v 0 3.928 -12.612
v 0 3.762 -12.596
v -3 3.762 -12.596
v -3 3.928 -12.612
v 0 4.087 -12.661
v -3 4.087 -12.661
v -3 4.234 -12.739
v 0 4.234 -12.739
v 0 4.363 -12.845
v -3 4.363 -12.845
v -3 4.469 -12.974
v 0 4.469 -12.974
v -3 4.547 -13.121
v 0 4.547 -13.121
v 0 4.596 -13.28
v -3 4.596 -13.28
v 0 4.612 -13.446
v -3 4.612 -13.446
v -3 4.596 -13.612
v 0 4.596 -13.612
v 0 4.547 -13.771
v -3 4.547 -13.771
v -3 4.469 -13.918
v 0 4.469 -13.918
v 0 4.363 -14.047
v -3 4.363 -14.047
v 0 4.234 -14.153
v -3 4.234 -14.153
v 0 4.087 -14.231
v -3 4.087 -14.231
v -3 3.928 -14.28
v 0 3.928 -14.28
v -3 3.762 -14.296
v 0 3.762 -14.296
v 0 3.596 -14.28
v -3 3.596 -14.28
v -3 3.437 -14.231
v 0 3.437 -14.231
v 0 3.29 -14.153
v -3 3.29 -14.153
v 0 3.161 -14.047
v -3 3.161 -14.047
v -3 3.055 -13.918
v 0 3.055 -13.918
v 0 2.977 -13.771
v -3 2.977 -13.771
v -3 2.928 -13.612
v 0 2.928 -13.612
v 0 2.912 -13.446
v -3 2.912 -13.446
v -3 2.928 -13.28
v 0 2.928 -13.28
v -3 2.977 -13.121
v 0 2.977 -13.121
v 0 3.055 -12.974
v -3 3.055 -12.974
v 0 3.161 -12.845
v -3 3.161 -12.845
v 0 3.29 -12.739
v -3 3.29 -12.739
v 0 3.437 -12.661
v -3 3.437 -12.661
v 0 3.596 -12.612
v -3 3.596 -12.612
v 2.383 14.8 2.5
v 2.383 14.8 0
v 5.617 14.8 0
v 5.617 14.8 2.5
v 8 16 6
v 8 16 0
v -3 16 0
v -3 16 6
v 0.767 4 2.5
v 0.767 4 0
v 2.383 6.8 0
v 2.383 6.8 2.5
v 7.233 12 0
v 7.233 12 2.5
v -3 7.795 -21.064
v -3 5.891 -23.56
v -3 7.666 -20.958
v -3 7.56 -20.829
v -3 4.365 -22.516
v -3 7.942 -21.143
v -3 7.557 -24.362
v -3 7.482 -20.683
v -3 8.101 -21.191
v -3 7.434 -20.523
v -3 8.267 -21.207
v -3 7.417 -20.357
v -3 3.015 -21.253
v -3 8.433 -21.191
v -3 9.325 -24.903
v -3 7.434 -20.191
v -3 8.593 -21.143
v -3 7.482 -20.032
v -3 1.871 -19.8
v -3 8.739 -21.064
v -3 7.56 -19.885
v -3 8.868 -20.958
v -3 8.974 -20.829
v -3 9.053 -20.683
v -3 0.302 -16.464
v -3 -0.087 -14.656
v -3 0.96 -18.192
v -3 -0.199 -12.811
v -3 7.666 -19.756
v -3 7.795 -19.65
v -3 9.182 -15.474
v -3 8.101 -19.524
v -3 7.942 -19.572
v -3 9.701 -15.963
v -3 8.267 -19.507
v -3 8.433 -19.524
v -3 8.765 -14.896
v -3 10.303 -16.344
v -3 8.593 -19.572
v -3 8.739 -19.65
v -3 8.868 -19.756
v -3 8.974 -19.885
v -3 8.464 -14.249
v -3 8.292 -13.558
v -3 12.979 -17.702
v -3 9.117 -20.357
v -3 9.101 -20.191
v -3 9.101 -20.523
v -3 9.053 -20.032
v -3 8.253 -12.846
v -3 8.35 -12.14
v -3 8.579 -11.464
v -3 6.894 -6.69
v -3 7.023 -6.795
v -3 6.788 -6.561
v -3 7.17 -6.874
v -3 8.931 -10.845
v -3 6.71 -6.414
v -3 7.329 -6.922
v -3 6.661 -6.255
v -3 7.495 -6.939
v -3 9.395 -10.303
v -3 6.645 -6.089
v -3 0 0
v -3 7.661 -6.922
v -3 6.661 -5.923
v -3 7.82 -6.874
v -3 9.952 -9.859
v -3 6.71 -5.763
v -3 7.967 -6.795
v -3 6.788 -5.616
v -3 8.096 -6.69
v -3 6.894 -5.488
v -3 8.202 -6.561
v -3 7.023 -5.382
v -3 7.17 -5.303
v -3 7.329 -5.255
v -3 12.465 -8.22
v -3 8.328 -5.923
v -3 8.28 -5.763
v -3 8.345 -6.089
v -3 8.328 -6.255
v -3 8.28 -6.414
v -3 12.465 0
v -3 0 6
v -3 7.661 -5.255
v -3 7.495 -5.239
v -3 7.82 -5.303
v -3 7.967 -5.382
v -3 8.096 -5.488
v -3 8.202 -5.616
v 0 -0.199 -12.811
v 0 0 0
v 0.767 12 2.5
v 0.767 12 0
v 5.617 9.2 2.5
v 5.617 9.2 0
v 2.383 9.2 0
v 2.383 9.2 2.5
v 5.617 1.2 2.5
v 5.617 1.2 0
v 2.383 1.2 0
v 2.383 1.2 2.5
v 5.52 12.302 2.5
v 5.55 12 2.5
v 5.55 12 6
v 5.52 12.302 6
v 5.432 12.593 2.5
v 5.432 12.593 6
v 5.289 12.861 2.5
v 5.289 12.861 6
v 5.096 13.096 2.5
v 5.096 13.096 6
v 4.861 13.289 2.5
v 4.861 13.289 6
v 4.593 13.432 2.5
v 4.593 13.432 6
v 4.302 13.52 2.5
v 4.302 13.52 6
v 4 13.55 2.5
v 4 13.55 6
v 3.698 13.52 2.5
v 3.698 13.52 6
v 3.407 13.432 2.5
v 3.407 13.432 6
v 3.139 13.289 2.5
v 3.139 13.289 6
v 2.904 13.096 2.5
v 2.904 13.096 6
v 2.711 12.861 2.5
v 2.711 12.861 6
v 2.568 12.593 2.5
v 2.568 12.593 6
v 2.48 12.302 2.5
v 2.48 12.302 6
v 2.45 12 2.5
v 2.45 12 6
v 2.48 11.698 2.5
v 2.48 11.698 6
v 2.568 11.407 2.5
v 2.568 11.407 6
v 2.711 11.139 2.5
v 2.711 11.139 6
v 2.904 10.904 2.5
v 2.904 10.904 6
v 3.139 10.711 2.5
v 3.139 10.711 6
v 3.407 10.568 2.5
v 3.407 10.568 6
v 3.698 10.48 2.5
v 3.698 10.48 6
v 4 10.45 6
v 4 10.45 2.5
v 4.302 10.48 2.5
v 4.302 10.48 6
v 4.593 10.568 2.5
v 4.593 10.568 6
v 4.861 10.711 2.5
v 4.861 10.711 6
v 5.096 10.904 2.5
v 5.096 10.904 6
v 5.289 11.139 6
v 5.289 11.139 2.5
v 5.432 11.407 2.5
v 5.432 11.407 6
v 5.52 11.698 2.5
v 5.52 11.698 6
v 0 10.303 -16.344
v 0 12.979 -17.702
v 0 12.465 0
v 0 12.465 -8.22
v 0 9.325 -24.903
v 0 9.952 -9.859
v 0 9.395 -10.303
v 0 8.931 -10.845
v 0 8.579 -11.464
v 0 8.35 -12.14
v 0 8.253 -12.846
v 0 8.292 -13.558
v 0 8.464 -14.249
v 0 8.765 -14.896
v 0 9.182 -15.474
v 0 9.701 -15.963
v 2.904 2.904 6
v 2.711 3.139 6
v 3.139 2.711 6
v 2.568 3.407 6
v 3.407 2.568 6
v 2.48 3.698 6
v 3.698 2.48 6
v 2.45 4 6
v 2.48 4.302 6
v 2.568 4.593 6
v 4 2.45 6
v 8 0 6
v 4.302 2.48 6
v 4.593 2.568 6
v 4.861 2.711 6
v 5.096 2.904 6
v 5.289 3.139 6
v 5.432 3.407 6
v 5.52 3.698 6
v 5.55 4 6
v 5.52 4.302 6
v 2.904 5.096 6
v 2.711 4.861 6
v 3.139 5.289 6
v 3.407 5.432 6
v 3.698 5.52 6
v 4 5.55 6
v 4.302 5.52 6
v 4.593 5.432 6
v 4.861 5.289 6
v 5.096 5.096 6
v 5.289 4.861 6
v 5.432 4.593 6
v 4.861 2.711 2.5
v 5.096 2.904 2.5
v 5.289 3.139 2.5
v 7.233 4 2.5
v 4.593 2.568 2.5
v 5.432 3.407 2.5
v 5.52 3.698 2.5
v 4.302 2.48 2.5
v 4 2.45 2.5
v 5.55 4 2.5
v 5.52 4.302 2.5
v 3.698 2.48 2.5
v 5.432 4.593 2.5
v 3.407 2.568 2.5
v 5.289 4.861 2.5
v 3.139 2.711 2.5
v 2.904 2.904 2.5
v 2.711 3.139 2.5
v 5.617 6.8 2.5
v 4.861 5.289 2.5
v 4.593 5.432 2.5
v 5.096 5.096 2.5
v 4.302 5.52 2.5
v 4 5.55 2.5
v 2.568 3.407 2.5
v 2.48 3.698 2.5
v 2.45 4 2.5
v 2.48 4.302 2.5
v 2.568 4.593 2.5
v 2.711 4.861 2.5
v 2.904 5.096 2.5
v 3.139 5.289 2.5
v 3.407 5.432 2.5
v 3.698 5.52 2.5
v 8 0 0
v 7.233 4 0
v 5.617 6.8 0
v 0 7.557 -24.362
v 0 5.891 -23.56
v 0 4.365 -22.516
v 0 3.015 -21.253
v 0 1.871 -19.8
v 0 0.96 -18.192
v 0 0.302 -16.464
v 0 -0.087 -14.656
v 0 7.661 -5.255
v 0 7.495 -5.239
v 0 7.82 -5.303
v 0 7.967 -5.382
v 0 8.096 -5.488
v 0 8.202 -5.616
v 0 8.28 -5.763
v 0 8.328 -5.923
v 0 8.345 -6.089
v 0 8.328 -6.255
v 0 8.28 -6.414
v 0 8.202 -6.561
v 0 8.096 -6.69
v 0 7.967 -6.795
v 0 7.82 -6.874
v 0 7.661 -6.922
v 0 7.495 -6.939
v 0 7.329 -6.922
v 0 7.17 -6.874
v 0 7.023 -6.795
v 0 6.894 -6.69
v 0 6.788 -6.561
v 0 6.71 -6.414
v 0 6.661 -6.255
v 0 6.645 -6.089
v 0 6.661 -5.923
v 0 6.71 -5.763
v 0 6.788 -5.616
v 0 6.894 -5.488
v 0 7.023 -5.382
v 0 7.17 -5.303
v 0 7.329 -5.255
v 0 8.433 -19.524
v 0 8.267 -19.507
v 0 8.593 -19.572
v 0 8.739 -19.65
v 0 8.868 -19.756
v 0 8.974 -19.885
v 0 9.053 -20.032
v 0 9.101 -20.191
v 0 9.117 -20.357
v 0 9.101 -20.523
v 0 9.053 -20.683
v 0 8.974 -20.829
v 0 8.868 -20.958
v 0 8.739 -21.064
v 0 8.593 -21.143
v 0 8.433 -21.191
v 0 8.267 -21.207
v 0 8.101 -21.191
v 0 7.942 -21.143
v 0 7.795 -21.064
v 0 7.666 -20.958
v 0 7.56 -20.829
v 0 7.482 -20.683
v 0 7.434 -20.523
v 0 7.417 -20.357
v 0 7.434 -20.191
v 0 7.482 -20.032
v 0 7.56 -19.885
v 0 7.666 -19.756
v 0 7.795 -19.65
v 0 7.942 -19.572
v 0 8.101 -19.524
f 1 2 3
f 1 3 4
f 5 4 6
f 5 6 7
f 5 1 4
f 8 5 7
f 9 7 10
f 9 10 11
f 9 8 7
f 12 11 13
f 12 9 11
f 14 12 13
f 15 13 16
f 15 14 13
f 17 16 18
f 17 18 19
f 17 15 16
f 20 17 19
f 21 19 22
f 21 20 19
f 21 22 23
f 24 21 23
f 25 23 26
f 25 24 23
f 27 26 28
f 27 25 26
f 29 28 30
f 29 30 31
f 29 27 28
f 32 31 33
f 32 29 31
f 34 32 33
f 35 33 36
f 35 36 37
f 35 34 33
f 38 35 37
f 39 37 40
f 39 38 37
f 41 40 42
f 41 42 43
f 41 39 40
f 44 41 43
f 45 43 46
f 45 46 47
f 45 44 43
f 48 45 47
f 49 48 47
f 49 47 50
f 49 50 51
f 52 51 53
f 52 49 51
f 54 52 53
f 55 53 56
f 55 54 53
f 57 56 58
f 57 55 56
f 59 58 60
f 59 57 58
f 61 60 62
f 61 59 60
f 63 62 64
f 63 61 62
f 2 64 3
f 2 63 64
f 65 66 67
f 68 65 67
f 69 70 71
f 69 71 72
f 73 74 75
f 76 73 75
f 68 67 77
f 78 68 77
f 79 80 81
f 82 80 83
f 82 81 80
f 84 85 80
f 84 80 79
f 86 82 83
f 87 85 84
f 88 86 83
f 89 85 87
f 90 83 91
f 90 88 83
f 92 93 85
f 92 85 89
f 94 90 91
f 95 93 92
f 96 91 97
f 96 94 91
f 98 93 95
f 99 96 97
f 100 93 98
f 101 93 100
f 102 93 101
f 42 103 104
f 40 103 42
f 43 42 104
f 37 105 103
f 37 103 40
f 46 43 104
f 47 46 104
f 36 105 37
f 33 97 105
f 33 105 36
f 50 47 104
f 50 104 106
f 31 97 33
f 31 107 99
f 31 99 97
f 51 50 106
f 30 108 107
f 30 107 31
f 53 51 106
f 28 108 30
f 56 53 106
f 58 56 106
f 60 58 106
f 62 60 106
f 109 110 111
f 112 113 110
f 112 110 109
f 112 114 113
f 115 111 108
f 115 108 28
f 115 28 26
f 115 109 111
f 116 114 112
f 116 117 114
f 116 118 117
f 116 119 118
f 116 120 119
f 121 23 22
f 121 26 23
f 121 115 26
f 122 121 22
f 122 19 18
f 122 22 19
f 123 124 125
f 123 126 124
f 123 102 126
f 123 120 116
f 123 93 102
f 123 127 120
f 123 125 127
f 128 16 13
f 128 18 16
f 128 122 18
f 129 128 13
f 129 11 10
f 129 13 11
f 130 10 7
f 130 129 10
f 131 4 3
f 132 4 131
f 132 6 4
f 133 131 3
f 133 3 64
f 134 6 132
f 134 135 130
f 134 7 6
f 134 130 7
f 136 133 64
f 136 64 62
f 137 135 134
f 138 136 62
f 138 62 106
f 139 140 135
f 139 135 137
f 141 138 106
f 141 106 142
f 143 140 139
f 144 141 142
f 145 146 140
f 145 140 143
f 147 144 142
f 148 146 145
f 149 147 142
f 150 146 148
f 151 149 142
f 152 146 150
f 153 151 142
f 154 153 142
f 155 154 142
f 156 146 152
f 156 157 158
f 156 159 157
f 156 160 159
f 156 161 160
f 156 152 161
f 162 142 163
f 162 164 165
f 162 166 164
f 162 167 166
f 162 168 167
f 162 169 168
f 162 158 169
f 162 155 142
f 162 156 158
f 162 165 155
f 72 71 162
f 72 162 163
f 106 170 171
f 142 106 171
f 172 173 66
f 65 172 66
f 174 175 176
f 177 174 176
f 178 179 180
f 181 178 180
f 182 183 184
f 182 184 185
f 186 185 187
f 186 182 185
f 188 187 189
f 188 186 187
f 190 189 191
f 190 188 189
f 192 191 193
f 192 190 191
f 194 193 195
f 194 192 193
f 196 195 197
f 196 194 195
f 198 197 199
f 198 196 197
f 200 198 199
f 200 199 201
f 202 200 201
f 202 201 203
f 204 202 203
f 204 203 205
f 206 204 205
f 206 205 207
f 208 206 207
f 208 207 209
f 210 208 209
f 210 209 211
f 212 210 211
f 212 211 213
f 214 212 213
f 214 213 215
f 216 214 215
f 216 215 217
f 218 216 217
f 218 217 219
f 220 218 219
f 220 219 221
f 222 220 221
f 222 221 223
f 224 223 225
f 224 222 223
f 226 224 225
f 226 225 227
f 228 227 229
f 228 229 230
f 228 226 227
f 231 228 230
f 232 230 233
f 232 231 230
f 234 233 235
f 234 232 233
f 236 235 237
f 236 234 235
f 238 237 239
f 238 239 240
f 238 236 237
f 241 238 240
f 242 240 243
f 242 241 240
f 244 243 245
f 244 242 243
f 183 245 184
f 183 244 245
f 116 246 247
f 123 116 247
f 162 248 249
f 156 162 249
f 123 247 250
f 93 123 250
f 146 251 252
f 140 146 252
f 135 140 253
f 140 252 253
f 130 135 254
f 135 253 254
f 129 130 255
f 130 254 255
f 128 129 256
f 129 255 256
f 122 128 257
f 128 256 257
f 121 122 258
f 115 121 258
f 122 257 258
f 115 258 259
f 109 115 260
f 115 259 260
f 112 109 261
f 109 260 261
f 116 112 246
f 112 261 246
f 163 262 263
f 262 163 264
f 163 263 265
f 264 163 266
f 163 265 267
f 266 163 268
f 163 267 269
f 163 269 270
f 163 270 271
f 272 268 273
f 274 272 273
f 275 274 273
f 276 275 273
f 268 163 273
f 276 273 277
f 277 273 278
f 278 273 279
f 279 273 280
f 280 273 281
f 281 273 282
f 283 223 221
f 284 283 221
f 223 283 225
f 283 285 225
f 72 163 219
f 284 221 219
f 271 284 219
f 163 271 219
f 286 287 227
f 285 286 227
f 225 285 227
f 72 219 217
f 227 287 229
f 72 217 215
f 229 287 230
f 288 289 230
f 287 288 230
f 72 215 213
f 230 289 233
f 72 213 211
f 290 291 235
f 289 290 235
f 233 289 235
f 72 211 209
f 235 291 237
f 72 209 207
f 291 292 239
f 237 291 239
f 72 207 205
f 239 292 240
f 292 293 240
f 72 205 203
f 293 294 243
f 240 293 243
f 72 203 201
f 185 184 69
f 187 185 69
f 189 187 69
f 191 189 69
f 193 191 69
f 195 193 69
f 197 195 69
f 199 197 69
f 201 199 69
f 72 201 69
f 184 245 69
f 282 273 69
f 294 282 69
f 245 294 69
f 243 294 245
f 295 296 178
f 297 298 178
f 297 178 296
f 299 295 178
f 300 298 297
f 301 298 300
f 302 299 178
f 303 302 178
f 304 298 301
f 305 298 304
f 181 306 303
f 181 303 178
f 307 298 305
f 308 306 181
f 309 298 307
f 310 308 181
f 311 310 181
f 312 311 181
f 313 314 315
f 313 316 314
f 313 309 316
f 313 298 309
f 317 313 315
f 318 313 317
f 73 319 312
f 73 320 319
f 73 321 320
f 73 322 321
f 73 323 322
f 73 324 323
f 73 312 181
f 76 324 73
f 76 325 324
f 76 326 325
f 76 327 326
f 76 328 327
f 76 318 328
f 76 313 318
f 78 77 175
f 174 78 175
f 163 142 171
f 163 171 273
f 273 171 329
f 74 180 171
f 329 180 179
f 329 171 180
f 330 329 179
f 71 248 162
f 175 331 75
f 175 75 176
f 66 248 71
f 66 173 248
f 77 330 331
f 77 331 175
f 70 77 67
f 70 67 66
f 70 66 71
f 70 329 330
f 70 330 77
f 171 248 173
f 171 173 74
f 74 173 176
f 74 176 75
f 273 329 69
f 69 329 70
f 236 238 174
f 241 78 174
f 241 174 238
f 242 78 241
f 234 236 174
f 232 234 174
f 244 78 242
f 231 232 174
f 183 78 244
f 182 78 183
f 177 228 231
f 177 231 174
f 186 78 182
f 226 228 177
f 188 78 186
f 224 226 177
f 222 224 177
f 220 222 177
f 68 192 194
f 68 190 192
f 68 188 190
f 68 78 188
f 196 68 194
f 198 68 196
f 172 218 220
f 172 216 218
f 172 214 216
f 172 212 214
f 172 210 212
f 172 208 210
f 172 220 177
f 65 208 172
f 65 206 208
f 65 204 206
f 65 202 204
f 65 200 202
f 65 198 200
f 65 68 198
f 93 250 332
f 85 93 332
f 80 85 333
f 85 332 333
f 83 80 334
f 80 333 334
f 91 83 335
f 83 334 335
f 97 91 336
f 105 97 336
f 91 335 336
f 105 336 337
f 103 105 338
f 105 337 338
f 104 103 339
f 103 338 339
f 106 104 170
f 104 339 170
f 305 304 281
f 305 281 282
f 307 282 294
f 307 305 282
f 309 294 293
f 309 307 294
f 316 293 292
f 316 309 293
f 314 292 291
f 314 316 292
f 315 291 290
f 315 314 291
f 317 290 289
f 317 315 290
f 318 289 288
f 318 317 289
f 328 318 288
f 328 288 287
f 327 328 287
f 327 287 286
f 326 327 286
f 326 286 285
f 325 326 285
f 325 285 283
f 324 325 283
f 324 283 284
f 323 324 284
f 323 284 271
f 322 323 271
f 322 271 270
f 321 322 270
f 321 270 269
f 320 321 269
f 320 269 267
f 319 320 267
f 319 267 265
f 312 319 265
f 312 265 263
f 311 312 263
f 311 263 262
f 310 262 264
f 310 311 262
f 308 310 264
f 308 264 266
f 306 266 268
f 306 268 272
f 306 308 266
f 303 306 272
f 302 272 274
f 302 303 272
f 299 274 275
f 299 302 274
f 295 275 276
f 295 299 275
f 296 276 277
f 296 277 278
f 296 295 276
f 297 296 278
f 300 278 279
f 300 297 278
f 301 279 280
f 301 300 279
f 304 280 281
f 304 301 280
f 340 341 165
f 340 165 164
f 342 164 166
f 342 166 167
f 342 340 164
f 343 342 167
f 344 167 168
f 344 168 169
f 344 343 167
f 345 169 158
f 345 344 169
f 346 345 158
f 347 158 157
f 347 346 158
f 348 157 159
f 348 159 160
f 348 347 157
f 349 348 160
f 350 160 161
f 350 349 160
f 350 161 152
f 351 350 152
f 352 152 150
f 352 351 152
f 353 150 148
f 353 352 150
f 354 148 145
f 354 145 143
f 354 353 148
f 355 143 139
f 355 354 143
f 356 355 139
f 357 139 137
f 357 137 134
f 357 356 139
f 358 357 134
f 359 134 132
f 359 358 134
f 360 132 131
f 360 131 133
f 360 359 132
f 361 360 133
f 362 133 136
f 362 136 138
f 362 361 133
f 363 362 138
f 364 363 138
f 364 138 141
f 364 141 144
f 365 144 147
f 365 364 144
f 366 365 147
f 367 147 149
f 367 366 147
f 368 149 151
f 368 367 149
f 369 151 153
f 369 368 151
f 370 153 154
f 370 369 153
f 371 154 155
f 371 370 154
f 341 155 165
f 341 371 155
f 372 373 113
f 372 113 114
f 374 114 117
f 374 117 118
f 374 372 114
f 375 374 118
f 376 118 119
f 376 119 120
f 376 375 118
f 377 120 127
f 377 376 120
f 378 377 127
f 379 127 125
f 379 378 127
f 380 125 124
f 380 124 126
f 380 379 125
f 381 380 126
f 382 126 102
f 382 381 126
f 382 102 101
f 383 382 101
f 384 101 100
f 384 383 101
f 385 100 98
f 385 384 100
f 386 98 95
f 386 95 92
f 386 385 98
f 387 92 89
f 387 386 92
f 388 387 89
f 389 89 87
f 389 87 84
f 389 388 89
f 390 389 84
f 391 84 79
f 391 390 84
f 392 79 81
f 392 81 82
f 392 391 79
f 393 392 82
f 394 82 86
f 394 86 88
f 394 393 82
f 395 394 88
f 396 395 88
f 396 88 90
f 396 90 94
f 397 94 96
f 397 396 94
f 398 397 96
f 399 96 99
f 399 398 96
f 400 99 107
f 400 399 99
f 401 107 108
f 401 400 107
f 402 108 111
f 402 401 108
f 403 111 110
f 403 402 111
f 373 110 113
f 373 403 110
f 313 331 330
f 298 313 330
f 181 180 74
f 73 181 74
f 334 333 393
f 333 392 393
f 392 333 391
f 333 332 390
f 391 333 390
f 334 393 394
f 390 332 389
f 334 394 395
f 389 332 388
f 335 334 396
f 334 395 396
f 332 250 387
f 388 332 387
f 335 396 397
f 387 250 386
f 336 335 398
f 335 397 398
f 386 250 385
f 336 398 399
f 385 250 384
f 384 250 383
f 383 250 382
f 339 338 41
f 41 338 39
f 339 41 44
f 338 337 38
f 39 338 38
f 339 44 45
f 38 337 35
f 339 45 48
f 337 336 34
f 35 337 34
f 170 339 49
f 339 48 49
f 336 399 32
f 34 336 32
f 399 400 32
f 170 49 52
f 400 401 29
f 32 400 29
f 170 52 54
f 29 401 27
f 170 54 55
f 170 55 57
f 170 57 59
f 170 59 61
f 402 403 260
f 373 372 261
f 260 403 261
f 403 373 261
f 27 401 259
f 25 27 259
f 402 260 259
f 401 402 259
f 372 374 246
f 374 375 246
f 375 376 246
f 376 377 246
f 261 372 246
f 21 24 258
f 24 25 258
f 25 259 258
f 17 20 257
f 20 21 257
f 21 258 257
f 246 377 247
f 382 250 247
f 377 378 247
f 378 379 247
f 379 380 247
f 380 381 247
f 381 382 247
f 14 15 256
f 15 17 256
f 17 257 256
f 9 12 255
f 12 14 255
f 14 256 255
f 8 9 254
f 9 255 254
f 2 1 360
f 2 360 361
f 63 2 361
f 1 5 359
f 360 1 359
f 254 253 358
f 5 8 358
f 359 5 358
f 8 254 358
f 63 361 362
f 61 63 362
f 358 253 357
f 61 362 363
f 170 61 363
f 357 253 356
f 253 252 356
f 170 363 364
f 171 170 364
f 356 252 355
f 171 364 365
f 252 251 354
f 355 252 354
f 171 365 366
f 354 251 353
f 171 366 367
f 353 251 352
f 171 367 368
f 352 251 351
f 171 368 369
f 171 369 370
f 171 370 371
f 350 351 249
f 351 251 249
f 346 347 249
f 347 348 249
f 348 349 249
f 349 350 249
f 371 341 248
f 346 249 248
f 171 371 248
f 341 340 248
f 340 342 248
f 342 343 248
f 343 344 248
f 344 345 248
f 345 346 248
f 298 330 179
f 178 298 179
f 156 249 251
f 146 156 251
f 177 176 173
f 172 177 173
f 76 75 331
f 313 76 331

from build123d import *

# Parameters (mm, degrees)
SKETCH1_W           = 8
SKETCH1_H           = 16
SKETCH1_R           = 1.55
BOSS_EXTRUDE1_DEPTH = 6
CUT_EXTRUDE1_DEPTH  = 2.5
SKETCH3_W           = 6
SKETCH3_H           = 16
SKETCH3_R           = 0.85
BOSS_EXTRUDE2_DEPTH = 3


with BuildPart() as part:
    # Sketch1 → Boss-Extrude1 (new body)
    with BuildSketch(Plane.XY):
        with Locations((4, 8)):
            Rectangle(SKETCH1_W, SKETCH1_H)
        with Locations((4, 12)):
            Circle(SKETCH1_R, mode=Mode.SUBTRACT)
        with Locations((4, 4)):
            Circle(SKETCH1_R, mode=Mode.SUBTRACT)
    extrude(amount=BOSS_EXTRUDE1_DEPTH)

    # Sketch2 → Cut-Extrude1 (cut)
    with BuildSketch(Plane(origin=(0, 0, 0), x_dir=(-1, 0, 0), z_dir=(0, 0, -1))):
        Polygon((-0.766838493, 12), (-2.383419246, 14.8), (-5.616580754, 14.8), (-7.233161507, 12), (-5.616580754, 9.2), (-2.383419246, 9.2), align=None)
        Polygon((-0.766838493, 4), (-2.383419246, 6.8), (-5.616580754, 6.8), (-7.233161507, 4), (-5.616580754, 1.2), (-2.383419246, 1.2), align=None)
    extrude(amount=-CUT_EXTRUDE1_DEPTH, mode=Mode.SUBTRACT)

    # Sketch3 → Boss-Extrude2 (add)
    # profile 1 of 2: a face of its own
    with BuildSketch(Plane.ZY):
        with Locations((3, 8)):
            Rectangle(SKETCH3_W, SKETCH3_H)
    # profile 2 of 2: a face of its own
    with BuildSketch(Plane.ZY):
        with BuildLine():
            Line((-16.344198667, 10.303286919), (-17.701569131, 12.978645853))
            Line((-17.701569131, 12.978645853), (-24.903097097, 9.324877666))
            ThreePointArc((-24.903097097, 9.324877666), (-20.548417458, 2.41556502), (-12.810955614, -0.198535249))
            Line((-12.810955614, -0.198535249), (0, 0))
            Line((0, 0), (0, 12.465392311))
            Line((0, 12.465392311), (-8.220260468, 12.465392311))
            Line((-8.220260468, 12.465392311), (-9.858504036, 9.95219554))
            ThreePointArc((-9.858504036, 9.95219554), (-13.202702703, 8.255482459), (-16.344198667, 10.303286919))
        make_face()
        with Locations((-13.445945946, 3.76206141)):
            Circle(SKETCH3_R, mode=Mode.SUBTRACT)
        with Locations((-6.088708879, 7.494830187)):
            Circle(SKETCH3_R, mode=Mode.SUBTRACT)
        with Locations((-20.357237067, 8.267231223)):
            Circle(SKETCH3_R, mode=Mode.SUBTRACT)
    extrude(amount=BOSS_EXTRUDE2_DEPTH)


solid = part.part
